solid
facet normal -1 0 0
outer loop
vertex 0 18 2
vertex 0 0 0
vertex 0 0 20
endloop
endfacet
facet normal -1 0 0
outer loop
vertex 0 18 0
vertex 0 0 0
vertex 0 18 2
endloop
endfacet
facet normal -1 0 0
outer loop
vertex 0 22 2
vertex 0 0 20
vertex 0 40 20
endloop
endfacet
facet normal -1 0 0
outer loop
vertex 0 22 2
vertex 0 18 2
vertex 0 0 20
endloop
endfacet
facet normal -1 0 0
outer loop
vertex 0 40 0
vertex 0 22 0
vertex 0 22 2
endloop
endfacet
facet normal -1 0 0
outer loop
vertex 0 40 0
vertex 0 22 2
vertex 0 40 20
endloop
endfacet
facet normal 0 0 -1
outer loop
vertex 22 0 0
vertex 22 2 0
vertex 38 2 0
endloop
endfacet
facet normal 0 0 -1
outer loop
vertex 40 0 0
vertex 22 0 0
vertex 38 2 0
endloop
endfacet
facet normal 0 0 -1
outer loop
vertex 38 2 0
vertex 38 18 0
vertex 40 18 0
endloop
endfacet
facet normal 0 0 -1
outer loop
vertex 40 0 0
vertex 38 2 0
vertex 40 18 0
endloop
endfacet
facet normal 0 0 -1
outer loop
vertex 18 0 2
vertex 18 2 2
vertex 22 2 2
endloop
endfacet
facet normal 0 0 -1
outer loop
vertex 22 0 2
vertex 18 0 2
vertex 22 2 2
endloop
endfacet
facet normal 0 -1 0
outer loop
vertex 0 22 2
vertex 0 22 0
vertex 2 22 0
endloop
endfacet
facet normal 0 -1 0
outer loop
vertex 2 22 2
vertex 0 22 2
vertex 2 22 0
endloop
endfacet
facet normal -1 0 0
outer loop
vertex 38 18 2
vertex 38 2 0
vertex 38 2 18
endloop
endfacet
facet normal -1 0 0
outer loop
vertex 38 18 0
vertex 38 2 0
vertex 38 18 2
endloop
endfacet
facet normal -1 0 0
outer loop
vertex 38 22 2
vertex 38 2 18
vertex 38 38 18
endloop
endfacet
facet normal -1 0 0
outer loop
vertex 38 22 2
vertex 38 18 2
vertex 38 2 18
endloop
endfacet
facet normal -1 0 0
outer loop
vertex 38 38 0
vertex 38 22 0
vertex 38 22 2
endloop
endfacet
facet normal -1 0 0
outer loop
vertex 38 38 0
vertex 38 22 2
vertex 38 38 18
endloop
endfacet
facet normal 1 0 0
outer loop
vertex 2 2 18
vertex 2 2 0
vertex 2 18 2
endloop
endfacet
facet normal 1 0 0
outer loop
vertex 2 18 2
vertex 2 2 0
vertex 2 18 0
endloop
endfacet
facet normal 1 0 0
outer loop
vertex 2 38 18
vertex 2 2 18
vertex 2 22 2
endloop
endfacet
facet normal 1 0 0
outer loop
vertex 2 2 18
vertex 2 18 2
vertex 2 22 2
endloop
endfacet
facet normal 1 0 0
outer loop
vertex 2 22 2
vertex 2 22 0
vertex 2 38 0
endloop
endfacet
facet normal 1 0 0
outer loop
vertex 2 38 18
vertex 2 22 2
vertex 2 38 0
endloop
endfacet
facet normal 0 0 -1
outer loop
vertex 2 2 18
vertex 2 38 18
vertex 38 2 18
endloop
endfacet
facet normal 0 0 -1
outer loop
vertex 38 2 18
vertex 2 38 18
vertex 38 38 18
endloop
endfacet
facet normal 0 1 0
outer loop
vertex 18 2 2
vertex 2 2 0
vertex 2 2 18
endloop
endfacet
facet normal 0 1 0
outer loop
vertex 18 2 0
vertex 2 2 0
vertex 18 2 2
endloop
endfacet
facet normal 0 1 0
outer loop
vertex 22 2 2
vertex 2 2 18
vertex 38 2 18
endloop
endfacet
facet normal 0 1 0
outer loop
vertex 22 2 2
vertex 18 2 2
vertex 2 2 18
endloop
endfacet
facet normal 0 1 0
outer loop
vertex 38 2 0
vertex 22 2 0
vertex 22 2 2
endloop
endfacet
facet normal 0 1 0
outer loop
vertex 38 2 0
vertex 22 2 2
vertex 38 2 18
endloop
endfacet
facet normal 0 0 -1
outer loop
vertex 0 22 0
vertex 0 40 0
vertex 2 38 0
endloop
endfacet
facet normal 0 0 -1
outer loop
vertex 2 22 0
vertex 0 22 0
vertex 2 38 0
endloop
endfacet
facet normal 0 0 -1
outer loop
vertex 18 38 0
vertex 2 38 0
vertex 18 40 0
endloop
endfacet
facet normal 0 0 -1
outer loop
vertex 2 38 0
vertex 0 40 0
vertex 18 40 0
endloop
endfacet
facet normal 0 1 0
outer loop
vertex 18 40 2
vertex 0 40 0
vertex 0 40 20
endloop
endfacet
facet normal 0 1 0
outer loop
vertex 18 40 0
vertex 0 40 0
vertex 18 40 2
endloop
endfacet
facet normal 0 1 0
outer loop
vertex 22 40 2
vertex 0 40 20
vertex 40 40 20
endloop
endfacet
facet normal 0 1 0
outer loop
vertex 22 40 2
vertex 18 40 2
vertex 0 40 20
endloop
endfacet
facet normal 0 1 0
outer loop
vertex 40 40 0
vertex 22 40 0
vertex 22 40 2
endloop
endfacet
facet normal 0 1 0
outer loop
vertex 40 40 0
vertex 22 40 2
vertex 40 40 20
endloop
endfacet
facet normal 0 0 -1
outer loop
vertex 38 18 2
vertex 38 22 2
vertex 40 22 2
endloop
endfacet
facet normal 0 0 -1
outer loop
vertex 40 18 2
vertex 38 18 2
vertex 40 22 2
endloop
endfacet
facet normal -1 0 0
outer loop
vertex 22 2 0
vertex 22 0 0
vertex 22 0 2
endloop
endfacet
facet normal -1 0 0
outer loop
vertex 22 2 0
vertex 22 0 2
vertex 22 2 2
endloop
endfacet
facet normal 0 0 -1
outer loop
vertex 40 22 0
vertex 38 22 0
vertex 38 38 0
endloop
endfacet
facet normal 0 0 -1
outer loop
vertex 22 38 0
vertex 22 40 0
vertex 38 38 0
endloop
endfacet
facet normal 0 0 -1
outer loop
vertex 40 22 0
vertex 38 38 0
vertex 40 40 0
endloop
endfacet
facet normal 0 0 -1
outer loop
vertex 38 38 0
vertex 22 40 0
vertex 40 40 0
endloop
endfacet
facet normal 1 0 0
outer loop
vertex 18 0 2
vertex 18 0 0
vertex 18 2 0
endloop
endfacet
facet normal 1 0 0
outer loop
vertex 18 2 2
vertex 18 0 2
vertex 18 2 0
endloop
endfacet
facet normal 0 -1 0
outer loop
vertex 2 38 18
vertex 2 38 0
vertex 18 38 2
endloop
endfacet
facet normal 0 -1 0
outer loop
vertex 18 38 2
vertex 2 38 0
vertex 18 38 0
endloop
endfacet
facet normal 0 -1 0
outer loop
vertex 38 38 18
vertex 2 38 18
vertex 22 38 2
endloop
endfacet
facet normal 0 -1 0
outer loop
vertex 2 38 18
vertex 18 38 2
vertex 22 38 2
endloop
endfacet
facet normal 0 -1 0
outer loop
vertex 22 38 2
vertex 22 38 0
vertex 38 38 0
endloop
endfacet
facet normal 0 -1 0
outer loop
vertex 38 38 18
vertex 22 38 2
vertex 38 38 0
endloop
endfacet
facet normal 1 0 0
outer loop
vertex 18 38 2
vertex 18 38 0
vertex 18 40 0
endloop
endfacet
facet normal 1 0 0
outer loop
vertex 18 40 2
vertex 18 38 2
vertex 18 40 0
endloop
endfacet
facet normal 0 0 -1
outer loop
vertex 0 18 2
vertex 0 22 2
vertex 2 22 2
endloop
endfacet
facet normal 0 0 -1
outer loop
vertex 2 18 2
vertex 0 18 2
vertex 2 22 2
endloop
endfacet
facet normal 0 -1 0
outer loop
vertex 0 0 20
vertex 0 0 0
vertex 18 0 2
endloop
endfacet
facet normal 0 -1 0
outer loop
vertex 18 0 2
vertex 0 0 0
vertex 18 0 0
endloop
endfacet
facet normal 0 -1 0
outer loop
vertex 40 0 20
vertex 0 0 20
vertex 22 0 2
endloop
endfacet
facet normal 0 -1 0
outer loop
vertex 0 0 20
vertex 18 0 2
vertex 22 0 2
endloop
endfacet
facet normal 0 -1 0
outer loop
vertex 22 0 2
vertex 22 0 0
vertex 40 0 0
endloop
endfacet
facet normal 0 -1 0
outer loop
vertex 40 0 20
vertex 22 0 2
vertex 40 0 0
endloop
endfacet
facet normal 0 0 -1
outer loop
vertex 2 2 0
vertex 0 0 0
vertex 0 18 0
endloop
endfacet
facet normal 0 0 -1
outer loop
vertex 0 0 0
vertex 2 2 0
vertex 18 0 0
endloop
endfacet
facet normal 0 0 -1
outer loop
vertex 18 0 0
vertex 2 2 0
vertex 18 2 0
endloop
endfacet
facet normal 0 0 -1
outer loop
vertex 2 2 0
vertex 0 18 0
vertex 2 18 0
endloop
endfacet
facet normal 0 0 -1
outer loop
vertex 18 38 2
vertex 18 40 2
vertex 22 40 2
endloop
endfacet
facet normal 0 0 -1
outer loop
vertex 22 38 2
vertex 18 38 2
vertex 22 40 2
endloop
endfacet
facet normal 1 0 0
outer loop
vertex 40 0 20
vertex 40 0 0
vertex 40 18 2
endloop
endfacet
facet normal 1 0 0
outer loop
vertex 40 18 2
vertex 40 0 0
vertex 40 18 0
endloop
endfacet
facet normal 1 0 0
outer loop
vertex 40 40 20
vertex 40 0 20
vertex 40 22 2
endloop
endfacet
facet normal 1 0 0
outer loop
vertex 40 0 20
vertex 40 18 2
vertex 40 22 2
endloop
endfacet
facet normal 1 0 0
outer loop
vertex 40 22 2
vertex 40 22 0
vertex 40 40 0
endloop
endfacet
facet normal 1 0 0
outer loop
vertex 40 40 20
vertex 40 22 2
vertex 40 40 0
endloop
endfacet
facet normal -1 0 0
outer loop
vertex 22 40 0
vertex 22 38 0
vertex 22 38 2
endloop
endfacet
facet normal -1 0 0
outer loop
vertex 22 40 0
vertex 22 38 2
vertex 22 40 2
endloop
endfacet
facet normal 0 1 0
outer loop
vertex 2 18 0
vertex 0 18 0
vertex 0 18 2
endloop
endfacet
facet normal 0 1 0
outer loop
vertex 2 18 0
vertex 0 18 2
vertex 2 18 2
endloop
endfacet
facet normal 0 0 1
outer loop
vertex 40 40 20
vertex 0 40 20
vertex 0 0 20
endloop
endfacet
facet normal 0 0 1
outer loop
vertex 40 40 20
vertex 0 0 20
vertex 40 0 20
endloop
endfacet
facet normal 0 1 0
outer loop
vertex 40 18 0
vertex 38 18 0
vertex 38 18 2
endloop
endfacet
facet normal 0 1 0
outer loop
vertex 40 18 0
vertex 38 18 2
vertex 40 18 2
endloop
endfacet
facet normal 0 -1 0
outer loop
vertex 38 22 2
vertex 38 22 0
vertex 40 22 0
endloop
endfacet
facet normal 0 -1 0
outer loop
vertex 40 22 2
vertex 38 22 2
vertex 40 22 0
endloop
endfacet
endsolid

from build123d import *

# Parameters (mm, degrees)
BOX005_W     = 4
BOX005_H     = 2
BOX005_DEPTH = 2
BOX004_W     = 2
BOX004_H     = 4
BOX004_DEPTH = 2
BOX003_W     = 4
BOX003_H     = 2
BOX003_DEPTH = 2
BOX002_W     = 2
BOX002_H     = 4
BOX002_DEPTH = 2
BOX001_W     = 36
BOX001_H     = 36
BOX001_DEPTH = 18
BOX_W        = 40
BOX_H        = 40
BOX_DEPTH    = 20


with BuildPart() as cubo005:
    # Box005 → Box005 (new body)
    with BuildSketch(Plane(origin=(18, 38, 0), x_dir=(1, 0, 0), z_dir=(0, 0, 1))):
        with Locations((2, 1)):
            Rectangle(BOX005_W, BOX005_H)
    extrude(amount=BOX005_DEPTH)


with BuildPart() as cubo004:
    # Box004 → Box004 (new body)
    with BuildSketch(Plane(origin=(38, 18, 0), x_dir=(1, 0, 0), z_dir=(0, 0, 1))):
        with Locations((1, 2)):
            Rectangle(BOX004_W, BOX004_H)
    extrude(amount=BOX004_DEPTH)


with BuildPart() as cubo003:
    # Box003 → Box003 (new body)
    with BuildSketch(Plane(origin=(18, 0, 0), x_dir=(1, 0, 0), z_dir=(0, 0, 1))):
        with Locations((2, 1)):
            Rectangle(BOX003_W, BOX003_H)
    extrude(amount=BOX003_DEPTH)


with BuildPart() as cubo002:
    # Box002 → Box002 (new body)
    with BuildSketch(Plane(origin=(0, 18, 0), x_dir=(1, 0, 0), z_dir=(0, 0, 1))):
        with Locations((1, 2)):
            Rectangle(BOX002_W, BOX002_H)
    extrude(amount=BOX002_DEPTH)


with BuildPart() as cubo001:
    # Box001 → Box001 (new body)
    with BuildSketch(Plane(origin=(2, 2, 0), x_dir=(1, 0, 0), z_dir=(0, 0, 1))):
        with Locations((18, 18)):
            Rectangle(BOX001_W, BOX001_H)
    extrude(amount=BOX001_DEPTH)


with BuildPart() as cut004:
    # Box → Box (new body)
    with BuildSketch(Plane.XY):
        with Locations((20, 20)):
            Rectangle(BOX_W, BOX_H)
    extrude(amount=BOX_DEPTH)

    # Cut: cut Cubo001
    add(cubo001.part, mode=Mode.SUBTRACT)

    # Cut001: cut Cubo002
    add(cubo002.part, mode=Mode.SUBTRACT)

    # Cut002: cut Cubo003
    add(cubo003.part, mode=Mode.SUBTRACT)

    # Cut003: cut Cubo004
    add(cubo004.part, mode=Mode.SUBTRACT)

    # Cut004: cut Cubo005
    add(cubo005.part, mode=Mode.SUBTRACT)


solid = cut004.part
